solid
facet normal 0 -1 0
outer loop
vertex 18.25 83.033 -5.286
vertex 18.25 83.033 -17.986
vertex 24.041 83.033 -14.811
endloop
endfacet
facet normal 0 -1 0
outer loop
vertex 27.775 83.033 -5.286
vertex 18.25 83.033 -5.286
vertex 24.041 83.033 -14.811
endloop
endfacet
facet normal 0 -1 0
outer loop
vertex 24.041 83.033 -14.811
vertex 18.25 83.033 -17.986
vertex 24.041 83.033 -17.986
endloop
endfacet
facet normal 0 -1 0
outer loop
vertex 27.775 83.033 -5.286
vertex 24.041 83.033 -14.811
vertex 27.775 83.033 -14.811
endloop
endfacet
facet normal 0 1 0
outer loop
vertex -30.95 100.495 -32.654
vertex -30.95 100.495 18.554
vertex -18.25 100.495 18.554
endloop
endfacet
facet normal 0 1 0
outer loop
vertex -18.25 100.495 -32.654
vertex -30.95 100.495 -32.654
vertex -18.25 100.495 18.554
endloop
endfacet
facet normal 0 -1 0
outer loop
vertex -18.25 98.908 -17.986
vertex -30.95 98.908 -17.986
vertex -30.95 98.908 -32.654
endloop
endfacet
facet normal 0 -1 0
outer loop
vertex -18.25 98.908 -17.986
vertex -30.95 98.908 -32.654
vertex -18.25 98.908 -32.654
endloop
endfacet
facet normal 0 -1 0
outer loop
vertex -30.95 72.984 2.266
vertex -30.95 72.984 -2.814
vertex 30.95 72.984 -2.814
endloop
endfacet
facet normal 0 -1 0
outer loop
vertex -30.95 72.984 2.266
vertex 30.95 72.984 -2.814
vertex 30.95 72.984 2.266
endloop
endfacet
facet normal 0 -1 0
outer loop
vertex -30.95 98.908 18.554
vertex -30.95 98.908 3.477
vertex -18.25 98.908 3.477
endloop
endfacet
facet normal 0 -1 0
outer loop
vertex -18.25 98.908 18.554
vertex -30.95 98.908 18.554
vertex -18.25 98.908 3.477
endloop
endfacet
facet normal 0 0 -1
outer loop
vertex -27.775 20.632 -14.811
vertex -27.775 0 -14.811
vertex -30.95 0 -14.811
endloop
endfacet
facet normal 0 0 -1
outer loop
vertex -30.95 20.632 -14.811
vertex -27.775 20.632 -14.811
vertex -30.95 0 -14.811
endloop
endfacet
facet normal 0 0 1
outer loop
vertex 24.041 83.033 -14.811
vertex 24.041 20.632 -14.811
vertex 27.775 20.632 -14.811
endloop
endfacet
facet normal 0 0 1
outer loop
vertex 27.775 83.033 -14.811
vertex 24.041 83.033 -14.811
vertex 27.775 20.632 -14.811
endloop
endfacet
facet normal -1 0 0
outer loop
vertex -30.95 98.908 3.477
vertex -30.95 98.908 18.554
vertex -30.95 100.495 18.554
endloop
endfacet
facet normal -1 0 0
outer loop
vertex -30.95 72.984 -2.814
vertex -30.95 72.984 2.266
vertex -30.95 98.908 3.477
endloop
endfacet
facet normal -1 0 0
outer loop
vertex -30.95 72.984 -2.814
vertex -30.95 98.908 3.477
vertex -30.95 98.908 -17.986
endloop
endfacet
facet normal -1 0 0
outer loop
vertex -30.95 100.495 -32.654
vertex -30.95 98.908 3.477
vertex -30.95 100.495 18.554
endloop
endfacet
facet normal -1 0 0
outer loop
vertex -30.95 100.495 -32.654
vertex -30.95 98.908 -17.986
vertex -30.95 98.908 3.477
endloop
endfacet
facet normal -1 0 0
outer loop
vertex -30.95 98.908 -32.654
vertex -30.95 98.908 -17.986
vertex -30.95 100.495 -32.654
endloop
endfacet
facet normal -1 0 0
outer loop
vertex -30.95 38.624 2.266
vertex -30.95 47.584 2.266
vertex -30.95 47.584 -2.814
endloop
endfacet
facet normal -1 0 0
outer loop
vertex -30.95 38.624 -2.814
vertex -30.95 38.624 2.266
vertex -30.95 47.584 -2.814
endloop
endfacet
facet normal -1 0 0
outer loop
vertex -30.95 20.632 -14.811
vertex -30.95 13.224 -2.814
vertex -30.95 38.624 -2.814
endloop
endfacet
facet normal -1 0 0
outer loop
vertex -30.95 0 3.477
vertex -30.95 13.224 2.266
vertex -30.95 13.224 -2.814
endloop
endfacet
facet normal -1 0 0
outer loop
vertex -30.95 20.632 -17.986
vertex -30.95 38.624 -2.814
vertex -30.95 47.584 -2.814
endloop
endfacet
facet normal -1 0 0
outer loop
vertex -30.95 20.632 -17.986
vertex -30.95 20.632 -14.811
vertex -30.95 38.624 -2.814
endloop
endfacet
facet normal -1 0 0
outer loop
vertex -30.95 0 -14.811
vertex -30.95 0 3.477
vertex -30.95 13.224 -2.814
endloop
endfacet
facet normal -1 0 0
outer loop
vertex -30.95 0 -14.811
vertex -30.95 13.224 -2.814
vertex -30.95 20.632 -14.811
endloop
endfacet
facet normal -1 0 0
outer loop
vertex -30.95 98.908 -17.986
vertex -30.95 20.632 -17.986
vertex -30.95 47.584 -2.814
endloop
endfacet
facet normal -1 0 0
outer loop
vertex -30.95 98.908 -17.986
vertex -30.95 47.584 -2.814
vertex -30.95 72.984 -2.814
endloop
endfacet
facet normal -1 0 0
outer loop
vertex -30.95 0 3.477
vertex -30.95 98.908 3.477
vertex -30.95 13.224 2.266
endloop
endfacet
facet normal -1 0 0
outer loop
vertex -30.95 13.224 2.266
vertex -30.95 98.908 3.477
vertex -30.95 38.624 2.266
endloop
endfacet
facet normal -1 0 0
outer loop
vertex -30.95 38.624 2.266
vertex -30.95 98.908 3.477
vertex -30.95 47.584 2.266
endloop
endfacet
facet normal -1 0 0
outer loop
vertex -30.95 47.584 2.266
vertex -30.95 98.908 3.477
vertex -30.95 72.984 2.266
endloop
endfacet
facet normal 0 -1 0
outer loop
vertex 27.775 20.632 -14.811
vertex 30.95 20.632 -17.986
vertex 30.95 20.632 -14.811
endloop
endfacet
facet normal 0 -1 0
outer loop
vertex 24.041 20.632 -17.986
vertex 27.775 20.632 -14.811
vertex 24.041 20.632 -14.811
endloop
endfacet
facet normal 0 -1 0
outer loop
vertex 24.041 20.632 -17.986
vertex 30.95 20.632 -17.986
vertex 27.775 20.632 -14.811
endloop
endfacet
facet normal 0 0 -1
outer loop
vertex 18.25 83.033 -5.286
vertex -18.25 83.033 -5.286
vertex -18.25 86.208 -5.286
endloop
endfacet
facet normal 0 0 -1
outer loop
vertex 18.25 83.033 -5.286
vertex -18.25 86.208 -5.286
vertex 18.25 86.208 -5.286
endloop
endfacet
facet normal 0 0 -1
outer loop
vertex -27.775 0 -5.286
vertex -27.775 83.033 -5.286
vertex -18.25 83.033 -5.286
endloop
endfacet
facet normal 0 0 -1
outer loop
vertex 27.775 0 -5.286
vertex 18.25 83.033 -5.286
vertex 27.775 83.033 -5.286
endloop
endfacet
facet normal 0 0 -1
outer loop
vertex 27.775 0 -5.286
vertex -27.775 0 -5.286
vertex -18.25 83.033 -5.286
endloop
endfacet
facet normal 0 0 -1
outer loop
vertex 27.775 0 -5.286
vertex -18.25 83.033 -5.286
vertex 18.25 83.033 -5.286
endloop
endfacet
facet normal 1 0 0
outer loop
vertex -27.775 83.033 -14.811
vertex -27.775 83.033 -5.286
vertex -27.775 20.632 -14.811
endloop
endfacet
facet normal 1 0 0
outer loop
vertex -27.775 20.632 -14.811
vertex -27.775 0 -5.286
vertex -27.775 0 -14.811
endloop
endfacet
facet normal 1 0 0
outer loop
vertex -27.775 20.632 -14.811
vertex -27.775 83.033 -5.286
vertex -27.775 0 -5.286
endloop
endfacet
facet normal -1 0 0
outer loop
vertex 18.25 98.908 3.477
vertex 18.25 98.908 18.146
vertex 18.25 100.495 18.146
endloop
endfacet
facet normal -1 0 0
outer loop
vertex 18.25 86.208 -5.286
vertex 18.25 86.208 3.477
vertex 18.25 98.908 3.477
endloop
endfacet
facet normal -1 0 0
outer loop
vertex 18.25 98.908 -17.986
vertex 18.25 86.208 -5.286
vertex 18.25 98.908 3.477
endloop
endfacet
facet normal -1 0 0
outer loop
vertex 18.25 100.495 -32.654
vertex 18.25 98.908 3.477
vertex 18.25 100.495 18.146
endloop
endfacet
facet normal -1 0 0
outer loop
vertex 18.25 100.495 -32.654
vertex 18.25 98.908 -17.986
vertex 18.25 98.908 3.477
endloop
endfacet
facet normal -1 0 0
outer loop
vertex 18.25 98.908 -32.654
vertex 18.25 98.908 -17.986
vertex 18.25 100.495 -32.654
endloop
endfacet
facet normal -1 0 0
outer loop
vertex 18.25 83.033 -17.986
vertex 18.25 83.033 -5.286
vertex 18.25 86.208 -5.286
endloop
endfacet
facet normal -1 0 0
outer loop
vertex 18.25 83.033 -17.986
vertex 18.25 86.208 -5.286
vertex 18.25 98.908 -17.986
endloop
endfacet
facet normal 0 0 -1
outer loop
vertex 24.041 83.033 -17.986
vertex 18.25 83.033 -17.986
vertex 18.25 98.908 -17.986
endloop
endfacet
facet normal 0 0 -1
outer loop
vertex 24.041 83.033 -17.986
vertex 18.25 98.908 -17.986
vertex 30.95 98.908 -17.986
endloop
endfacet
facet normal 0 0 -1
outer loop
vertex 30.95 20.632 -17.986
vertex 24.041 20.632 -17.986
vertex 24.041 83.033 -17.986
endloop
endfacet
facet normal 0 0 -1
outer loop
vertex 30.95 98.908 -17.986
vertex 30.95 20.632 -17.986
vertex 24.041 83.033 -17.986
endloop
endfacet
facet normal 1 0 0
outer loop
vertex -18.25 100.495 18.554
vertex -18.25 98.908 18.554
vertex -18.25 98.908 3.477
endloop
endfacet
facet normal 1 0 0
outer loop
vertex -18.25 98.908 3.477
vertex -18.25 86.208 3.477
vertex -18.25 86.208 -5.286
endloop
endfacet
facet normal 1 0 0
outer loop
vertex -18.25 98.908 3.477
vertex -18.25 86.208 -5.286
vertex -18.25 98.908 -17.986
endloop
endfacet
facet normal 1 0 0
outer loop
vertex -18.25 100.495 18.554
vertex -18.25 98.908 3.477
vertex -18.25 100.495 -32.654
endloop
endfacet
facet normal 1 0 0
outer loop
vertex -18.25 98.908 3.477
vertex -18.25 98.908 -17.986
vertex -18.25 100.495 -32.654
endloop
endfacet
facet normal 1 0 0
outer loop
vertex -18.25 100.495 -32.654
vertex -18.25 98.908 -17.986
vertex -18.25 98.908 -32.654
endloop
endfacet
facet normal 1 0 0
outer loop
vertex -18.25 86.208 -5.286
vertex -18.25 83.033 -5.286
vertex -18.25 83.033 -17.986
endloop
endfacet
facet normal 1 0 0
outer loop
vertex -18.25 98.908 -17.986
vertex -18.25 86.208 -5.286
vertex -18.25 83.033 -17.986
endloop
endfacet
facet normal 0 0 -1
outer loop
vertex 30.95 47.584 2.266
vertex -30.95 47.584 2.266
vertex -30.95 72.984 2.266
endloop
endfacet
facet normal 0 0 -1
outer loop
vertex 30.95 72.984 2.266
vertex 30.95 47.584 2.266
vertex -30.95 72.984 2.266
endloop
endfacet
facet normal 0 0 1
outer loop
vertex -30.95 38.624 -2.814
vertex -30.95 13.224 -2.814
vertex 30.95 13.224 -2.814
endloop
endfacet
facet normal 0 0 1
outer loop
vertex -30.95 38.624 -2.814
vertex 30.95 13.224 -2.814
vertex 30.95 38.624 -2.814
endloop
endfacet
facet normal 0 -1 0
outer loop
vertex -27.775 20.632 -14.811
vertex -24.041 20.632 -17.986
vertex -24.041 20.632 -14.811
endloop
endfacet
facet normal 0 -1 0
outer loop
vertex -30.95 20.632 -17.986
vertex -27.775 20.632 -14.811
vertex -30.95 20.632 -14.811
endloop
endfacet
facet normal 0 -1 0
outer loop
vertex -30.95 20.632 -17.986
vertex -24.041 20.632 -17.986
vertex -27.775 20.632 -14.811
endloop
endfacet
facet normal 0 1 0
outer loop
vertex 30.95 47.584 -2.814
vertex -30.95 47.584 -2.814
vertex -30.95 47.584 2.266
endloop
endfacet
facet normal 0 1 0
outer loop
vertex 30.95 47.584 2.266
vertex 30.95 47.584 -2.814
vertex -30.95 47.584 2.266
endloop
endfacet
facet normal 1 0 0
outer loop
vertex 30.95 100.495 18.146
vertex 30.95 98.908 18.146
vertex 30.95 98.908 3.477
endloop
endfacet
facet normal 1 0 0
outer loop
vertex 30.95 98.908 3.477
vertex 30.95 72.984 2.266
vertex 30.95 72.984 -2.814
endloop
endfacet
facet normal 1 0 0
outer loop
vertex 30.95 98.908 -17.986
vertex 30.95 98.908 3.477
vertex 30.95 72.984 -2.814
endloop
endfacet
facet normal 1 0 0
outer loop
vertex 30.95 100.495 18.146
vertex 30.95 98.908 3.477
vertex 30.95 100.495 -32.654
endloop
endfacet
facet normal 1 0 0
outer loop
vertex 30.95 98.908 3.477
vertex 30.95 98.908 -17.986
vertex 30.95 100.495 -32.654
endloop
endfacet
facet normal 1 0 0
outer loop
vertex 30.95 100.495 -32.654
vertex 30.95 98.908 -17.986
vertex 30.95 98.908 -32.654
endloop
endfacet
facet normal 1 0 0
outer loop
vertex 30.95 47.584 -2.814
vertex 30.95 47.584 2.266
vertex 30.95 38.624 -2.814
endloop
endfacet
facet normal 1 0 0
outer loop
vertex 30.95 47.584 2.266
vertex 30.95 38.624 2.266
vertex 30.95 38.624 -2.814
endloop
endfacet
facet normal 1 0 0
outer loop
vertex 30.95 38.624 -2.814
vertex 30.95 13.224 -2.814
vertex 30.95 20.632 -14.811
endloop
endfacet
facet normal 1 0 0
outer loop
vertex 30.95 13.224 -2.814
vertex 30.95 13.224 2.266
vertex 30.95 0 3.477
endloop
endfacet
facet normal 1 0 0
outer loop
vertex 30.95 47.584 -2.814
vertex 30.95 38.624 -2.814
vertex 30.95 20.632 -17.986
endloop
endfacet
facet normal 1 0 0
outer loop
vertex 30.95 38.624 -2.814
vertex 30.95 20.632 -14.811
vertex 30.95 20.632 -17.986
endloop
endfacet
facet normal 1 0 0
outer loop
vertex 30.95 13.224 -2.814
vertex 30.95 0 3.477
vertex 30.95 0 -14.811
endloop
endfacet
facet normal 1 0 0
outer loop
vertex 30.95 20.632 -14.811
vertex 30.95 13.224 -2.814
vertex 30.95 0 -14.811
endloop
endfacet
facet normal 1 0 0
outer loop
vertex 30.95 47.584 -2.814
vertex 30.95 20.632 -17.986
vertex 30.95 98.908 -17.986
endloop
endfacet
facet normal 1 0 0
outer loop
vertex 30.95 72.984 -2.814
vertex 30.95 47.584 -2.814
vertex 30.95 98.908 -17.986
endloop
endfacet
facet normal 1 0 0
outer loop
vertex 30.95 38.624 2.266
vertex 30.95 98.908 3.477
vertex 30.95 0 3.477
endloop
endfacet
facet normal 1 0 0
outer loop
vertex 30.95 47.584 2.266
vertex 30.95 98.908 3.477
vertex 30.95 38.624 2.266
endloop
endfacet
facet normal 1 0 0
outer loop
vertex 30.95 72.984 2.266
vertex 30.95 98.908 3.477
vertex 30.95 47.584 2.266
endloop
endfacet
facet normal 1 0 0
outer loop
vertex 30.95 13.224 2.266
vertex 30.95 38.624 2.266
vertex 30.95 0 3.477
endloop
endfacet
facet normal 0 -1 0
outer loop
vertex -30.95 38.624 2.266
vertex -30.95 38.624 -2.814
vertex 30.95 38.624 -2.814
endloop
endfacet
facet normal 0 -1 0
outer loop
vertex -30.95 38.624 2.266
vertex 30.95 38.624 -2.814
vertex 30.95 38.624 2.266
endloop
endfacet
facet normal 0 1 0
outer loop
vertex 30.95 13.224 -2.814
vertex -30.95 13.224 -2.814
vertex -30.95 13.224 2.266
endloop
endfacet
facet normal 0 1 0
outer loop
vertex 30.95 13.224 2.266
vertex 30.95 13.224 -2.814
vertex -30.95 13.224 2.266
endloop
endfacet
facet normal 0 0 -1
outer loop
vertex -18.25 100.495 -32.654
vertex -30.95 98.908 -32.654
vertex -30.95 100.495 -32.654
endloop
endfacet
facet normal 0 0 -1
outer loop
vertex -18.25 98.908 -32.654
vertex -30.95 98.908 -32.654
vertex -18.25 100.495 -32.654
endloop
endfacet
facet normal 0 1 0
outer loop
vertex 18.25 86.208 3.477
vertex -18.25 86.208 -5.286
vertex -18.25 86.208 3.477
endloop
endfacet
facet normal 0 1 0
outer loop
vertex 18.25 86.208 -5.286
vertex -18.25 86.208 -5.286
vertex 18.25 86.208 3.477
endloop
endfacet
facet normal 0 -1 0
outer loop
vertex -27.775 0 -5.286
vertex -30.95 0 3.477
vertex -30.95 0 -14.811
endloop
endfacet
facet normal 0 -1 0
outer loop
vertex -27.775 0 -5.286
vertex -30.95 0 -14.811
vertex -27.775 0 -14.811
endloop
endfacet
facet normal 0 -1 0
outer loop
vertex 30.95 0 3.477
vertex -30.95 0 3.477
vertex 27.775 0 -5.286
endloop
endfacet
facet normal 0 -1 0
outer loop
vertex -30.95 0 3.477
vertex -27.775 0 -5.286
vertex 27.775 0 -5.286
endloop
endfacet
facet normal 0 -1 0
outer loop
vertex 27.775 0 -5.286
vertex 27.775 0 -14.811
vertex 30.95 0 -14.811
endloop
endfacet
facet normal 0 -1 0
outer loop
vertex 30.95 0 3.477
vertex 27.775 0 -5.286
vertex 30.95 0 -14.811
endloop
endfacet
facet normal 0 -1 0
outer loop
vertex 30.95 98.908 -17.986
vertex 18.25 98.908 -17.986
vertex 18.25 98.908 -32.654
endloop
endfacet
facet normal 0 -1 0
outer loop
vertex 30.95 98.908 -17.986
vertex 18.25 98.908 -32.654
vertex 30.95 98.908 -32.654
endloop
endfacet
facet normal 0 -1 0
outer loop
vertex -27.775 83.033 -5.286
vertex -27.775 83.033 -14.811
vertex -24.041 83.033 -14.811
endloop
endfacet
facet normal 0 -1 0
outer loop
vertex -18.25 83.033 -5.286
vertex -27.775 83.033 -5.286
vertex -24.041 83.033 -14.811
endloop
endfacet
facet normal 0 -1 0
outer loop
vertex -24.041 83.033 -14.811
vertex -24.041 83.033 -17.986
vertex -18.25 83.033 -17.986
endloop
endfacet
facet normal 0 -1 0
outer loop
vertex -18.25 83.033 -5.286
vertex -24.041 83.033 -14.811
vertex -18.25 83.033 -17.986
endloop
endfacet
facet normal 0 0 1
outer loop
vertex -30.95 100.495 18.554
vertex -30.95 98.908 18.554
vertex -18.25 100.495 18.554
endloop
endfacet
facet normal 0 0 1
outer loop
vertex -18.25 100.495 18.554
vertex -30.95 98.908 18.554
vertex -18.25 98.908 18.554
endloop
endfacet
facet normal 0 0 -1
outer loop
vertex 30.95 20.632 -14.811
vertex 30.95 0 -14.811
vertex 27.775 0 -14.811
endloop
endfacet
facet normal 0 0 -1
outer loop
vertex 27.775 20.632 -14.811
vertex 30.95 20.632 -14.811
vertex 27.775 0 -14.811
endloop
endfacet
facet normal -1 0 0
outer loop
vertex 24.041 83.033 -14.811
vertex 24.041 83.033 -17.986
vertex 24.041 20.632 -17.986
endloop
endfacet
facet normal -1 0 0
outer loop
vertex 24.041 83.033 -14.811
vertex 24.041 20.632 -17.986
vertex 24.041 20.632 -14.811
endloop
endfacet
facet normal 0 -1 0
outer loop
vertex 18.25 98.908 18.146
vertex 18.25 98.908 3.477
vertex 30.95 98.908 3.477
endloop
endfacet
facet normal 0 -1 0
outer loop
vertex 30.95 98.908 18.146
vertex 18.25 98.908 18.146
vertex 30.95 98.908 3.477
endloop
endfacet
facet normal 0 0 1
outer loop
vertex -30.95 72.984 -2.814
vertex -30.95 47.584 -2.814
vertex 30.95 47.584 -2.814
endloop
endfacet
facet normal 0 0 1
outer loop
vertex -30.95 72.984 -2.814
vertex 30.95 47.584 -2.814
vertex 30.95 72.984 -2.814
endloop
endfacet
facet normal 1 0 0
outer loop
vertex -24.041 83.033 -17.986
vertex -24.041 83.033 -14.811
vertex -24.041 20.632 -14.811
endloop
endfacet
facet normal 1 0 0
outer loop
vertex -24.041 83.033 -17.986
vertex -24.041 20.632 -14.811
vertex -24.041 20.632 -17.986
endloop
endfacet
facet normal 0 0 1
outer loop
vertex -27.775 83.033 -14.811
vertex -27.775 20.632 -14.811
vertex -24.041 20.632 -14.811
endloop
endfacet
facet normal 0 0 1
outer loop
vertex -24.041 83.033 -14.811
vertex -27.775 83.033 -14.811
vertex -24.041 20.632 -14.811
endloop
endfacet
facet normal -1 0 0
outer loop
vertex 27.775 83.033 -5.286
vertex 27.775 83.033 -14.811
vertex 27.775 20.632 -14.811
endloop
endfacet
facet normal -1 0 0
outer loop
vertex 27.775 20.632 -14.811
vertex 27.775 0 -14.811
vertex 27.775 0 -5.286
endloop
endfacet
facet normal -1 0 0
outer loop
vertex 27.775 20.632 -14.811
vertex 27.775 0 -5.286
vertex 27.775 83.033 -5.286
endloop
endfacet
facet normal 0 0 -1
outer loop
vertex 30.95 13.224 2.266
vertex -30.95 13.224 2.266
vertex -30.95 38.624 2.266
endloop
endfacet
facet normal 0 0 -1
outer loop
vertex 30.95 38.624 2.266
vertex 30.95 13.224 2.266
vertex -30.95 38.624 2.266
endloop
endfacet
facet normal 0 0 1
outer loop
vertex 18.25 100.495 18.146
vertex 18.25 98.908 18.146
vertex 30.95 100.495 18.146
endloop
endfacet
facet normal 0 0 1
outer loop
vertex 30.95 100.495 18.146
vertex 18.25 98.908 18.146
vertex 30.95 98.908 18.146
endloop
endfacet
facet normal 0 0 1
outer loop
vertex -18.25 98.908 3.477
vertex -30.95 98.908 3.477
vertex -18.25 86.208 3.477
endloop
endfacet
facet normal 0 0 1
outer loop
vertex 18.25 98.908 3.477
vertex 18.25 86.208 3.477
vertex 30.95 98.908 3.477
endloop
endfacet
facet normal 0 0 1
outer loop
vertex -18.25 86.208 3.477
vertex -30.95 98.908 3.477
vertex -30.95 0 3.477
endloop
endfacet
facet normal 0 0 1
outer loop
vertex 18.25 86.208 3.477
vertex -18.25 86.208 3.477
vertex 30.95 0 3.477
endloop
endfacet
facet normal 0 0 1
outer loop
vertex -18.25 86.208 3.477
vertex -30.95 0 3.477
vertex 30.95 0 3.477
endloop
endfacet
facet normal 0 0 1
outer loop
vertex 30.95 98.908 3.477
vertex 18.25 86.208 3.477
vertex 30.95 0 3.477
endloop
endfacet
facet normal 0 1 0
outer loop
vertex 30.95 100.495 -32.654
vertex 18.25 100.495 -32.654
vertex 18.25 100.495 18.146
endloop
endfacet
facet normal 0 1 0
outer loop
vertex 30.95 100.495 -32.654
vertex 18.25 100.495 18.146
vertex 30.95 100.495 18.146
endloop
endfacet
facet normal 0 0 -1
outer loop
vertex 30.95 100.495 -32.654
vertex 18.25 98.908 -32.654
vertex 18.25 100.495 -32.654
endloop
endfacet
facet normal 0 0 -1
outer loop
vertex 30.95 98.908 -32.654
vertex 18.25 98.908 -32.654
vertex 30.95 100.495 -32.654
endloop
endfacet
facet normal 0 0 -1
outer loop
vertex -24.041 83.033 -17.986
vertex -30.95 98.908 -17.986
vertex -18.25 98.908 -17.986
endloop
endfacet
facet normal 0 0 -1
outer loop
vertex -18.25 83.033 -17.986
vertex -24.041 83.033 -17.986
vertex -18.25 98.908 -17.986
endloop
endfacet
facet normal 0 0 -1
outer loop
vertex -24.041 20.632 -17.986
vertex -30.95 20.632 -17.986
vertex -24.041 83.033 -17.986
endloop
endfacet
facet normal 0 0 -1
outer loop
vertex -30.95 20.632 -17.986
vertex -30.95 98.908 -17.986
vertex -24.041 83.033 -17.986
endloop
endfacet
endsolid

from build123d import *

# Parameters (mm, degrees)
BOSS_EXTRUDE1_DEPTH = 83.0326
SKETCH6_W           = 61.8998
SKETCH6_H           = 21.463
BOSS_EXTRUDE3_DEPTH = 3.175
SKETCH7_W           = 16.5354
SKETCH7_H           = 9.525
CUT_EXTRUDE2_DEPTH  = 91.420129415
SKETCH8_W           = 5.08
SKETCH8_H           = 25.4
CUT_EXTRUDE3_DEPTH  = 108.64212172
SKETCH15_W          = 61.8998
SKETCH15_H          = 20.63242
CUT_EXTRUDE4_DEPTH  = 3.175
SKETCH16_W          = 36.4998
SKETCH16_H          = 12.7
CUT_EXTRUDE5_DEPTH  = 3.175
SKETCH17_W          = 12.7
SKETCH17_H          = 21.463
BOSS_EXTRUDE4_DEPTH = 12.7
SKETCH18_W          = 12.7
SKETCH18_H          = 50.8
BOSS_EXTRUDE5_DEPTH = 1.5875
SKETCH19_W          = 12.7
SKETCH19_H          = 51.208048645
BOSS_EXTRUDE6_DEPTH = 1.5875


with BuildPart() as part:
    # Sketch1 → Boss-Extrude1 (new body)
    with BuildSketch(Plane(origin=(0, 0, 0), x_dir=(1, 0, 0), z_dir=(0, 1, 0))):
        Polygon((-30.9499, -3.477149156), (30.9499, -3.477149156), (30.9499, 17.985850844), (24.0411, 17.985850844), (24.0411, 14.810850844), (27.7749, 14.810850844), (27.7749, 5.285850844), (-27.7749, 5.285850844), (-27.7749, 14.810850844), (-24.0411, 14.810850844), (-24.0411, 17.985850844), (-30.9499, 17.985850844), align=None)
    extrude(amount=BOSS_EXTRUDE1_DEPTH)

    # Sketch6 → Boss-Extrude3 (add)
    with BuildSketch(Plane(origin=(0, 83.0326, 0), x_dir=(1, 0, 0), z_dir=(0, 1, 0))):
        with Locations((0, 7.254350844)):
            Rectangle(SKETCH6_W, SKETCH6_H)
    extrude(amount=BOSS_EXTRUDE3_DEPTH)

    # Sketch7 → Cut-Extrude2 (cut, through all)
    with BuildSketch(Plane.XZ.offset(-83.0326)):
        with Locations((0, -10.048350844)):
            Rectangle(SKETCH7_W, SKETCH7_H)
    extrude(amount=-CUT_EXTRUDE2_DEPTH, mode=Mode.SUBTRACT)

    # Sketch8 → Cut-Extrude3 (cut, through all)
    with BuildSketch(Plane.ZY.offset(30.9499)):
        with Locations((-0.274453158, 60.28364576)):
            Rectangle(SKETCH8_W, SKETCH8_H)
        with Locations((-0.274453158, 25.92395424)):
            Rectangle(SKETCH8_W, SKETCH8_H)
    extrude(amount=-CUT_EXTRUDE3_DEPTH, mode=Mode.SUBTRACT)

    # Sketch15 → Cut-Extrude4 (cut)
    with BuildSketch(Plane(origin=(0, 0, -17.985850844), x_dir=(-1, 0, 0), z_dir=(0, 0, -1))):
        with Locations((0, 10.31621)):
            Rectangle(SKETCH15_W, SKETCH15_H)
    extrude(amount=-CUT_EXTRUDE4_DEPTH, mode=Mode.SUBTRACT)

    # Sketch16 → Cut-Extrude5 (cut)
    with BuildSketch(Plane(origin=(0, 86.2076, 0), x_dir=(1, 0, 0), z_dir=(0, 1, 0))):
        with Locations((0, 11.635850844)):
            Rectangle(SKETCH16_W, SKETCH16_H)
    extrude(amount=-CUT_EXTRUDE5_DEPTH, mode=Mode.SUBTRACT)

    # Sketch17 → Boss-Extrude4 (add)
    with BuildSketch(Plane(origin=(0, 86.2076, 0), x_dir=(1, 0, 0), z_dir=(0, 1, 0))):
        with Locations((-24.5999, 7.254350844)):
            Rectangle(SKETCH17_W, SKETCH17_H)
        with Locations((24.5999, 7.254350844)):
            Rectangle(SKETCH17_W, SKETCH17_H)
    extrude(amount=BOSS_EXTRUDE4_DEPTH)

    # Sketch18 → Boss-Extrude5 (add)
    with BuildSketch(Plane(origin=(0, 98.9076, 0), x_dir=(1, 0, 0), z_dir=(0, 1, 0))):
        with Locations((24.5999, 7.254350844)):
            Rectangle(SKETCH18_W, SKETCH18_H)
    extrude(amount=BOSS_EXTRUDE5_DEPTH)

    # Sketch19 → Boss-Extrude6 (add)
    with BuildSketch(Plane(origin=(0, 98.9076, 0), x_dir=(1, 0, 0), z_dir=(0, 1, 0))):
        with Locations((-24.5999, 7.050326521)):
            Rectangle(SKETCH19_W, SKETCH19_H)
    extrude(amount=BOSS_EXTRUDE6_DEPTH)


solid = part.part
